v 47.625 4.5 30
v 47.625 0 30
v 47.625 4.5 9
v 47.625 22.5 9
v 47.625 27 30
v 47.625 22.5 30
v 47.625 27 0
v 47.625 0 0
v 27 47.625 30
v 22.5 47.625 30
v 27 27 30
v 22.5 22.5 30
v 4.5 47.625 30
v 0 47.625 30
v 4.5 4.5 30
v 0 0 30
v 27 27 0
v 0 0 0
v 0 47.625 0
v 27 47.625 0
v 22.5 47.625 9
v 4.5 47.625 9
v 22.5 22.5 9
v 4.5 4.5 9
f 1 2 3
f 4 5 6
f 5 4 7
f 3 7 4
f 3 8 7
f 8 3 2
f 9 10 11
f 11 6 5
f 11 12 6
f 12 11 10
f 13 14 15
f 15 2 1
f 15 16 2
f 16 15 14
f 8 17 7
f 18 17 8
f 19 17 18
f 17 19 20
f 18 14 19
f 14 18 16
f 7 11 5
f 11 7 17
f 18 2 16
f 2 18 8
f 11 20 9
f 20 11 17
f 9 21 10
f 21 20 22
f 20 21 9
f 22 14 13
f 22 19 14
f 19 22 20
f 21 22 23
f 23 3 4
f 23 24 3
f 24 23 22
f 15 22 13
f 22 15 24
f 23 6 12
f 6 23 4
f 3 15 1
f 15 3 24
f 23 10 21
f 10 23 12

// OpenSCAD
corner_piece_rgb_matrix();

module corner_piece_rgb_matrix () {
    // Units are in inches
    //rgb_matrix_depth = 0.55;
    //rgb_matrix_width = 7.5;
    //wedge_height = 2;
    
    // Units are in mm
    rgb_matrix_depth = 18;
    rgb_matrix_width = 190.5;
    wedge_height = 30;
    
  
    corner_wedge_face_length = rgb_matrix_width / 4;
    corner_wedge_face_height = rgb_matrix_depth * 1.5;
    corner_wedge_face_depth  = rgb_matrix_depth * 1.5;
    
    trough_width = rgb_matrix_depth;
    
    // draw dat wedge   
    difference() {  
        union() {
            cube([corner_wedge_face_length, corner_wedge_face_depth, wedge_height]);
            cube([corner_wedge_face_depth, corner_wedge_face_length, wedge_height]);        
        }
        
        union() {
            translate([corner_wedge_face_height/6, corner_wedge_face_height/6,rgb_matrix_depth/2])
              cube([corner_wedge_face_length, rgb_matrix_depth, wedge_height]);
     
            translate([corner_wedge_face_height/6, rgb_matrix_depth,rgb_matrix_depth/2])
              cube([rgb_matrix_depth, corner_wedge_face_length, wedge_height]);                
        }
        
    }
}
